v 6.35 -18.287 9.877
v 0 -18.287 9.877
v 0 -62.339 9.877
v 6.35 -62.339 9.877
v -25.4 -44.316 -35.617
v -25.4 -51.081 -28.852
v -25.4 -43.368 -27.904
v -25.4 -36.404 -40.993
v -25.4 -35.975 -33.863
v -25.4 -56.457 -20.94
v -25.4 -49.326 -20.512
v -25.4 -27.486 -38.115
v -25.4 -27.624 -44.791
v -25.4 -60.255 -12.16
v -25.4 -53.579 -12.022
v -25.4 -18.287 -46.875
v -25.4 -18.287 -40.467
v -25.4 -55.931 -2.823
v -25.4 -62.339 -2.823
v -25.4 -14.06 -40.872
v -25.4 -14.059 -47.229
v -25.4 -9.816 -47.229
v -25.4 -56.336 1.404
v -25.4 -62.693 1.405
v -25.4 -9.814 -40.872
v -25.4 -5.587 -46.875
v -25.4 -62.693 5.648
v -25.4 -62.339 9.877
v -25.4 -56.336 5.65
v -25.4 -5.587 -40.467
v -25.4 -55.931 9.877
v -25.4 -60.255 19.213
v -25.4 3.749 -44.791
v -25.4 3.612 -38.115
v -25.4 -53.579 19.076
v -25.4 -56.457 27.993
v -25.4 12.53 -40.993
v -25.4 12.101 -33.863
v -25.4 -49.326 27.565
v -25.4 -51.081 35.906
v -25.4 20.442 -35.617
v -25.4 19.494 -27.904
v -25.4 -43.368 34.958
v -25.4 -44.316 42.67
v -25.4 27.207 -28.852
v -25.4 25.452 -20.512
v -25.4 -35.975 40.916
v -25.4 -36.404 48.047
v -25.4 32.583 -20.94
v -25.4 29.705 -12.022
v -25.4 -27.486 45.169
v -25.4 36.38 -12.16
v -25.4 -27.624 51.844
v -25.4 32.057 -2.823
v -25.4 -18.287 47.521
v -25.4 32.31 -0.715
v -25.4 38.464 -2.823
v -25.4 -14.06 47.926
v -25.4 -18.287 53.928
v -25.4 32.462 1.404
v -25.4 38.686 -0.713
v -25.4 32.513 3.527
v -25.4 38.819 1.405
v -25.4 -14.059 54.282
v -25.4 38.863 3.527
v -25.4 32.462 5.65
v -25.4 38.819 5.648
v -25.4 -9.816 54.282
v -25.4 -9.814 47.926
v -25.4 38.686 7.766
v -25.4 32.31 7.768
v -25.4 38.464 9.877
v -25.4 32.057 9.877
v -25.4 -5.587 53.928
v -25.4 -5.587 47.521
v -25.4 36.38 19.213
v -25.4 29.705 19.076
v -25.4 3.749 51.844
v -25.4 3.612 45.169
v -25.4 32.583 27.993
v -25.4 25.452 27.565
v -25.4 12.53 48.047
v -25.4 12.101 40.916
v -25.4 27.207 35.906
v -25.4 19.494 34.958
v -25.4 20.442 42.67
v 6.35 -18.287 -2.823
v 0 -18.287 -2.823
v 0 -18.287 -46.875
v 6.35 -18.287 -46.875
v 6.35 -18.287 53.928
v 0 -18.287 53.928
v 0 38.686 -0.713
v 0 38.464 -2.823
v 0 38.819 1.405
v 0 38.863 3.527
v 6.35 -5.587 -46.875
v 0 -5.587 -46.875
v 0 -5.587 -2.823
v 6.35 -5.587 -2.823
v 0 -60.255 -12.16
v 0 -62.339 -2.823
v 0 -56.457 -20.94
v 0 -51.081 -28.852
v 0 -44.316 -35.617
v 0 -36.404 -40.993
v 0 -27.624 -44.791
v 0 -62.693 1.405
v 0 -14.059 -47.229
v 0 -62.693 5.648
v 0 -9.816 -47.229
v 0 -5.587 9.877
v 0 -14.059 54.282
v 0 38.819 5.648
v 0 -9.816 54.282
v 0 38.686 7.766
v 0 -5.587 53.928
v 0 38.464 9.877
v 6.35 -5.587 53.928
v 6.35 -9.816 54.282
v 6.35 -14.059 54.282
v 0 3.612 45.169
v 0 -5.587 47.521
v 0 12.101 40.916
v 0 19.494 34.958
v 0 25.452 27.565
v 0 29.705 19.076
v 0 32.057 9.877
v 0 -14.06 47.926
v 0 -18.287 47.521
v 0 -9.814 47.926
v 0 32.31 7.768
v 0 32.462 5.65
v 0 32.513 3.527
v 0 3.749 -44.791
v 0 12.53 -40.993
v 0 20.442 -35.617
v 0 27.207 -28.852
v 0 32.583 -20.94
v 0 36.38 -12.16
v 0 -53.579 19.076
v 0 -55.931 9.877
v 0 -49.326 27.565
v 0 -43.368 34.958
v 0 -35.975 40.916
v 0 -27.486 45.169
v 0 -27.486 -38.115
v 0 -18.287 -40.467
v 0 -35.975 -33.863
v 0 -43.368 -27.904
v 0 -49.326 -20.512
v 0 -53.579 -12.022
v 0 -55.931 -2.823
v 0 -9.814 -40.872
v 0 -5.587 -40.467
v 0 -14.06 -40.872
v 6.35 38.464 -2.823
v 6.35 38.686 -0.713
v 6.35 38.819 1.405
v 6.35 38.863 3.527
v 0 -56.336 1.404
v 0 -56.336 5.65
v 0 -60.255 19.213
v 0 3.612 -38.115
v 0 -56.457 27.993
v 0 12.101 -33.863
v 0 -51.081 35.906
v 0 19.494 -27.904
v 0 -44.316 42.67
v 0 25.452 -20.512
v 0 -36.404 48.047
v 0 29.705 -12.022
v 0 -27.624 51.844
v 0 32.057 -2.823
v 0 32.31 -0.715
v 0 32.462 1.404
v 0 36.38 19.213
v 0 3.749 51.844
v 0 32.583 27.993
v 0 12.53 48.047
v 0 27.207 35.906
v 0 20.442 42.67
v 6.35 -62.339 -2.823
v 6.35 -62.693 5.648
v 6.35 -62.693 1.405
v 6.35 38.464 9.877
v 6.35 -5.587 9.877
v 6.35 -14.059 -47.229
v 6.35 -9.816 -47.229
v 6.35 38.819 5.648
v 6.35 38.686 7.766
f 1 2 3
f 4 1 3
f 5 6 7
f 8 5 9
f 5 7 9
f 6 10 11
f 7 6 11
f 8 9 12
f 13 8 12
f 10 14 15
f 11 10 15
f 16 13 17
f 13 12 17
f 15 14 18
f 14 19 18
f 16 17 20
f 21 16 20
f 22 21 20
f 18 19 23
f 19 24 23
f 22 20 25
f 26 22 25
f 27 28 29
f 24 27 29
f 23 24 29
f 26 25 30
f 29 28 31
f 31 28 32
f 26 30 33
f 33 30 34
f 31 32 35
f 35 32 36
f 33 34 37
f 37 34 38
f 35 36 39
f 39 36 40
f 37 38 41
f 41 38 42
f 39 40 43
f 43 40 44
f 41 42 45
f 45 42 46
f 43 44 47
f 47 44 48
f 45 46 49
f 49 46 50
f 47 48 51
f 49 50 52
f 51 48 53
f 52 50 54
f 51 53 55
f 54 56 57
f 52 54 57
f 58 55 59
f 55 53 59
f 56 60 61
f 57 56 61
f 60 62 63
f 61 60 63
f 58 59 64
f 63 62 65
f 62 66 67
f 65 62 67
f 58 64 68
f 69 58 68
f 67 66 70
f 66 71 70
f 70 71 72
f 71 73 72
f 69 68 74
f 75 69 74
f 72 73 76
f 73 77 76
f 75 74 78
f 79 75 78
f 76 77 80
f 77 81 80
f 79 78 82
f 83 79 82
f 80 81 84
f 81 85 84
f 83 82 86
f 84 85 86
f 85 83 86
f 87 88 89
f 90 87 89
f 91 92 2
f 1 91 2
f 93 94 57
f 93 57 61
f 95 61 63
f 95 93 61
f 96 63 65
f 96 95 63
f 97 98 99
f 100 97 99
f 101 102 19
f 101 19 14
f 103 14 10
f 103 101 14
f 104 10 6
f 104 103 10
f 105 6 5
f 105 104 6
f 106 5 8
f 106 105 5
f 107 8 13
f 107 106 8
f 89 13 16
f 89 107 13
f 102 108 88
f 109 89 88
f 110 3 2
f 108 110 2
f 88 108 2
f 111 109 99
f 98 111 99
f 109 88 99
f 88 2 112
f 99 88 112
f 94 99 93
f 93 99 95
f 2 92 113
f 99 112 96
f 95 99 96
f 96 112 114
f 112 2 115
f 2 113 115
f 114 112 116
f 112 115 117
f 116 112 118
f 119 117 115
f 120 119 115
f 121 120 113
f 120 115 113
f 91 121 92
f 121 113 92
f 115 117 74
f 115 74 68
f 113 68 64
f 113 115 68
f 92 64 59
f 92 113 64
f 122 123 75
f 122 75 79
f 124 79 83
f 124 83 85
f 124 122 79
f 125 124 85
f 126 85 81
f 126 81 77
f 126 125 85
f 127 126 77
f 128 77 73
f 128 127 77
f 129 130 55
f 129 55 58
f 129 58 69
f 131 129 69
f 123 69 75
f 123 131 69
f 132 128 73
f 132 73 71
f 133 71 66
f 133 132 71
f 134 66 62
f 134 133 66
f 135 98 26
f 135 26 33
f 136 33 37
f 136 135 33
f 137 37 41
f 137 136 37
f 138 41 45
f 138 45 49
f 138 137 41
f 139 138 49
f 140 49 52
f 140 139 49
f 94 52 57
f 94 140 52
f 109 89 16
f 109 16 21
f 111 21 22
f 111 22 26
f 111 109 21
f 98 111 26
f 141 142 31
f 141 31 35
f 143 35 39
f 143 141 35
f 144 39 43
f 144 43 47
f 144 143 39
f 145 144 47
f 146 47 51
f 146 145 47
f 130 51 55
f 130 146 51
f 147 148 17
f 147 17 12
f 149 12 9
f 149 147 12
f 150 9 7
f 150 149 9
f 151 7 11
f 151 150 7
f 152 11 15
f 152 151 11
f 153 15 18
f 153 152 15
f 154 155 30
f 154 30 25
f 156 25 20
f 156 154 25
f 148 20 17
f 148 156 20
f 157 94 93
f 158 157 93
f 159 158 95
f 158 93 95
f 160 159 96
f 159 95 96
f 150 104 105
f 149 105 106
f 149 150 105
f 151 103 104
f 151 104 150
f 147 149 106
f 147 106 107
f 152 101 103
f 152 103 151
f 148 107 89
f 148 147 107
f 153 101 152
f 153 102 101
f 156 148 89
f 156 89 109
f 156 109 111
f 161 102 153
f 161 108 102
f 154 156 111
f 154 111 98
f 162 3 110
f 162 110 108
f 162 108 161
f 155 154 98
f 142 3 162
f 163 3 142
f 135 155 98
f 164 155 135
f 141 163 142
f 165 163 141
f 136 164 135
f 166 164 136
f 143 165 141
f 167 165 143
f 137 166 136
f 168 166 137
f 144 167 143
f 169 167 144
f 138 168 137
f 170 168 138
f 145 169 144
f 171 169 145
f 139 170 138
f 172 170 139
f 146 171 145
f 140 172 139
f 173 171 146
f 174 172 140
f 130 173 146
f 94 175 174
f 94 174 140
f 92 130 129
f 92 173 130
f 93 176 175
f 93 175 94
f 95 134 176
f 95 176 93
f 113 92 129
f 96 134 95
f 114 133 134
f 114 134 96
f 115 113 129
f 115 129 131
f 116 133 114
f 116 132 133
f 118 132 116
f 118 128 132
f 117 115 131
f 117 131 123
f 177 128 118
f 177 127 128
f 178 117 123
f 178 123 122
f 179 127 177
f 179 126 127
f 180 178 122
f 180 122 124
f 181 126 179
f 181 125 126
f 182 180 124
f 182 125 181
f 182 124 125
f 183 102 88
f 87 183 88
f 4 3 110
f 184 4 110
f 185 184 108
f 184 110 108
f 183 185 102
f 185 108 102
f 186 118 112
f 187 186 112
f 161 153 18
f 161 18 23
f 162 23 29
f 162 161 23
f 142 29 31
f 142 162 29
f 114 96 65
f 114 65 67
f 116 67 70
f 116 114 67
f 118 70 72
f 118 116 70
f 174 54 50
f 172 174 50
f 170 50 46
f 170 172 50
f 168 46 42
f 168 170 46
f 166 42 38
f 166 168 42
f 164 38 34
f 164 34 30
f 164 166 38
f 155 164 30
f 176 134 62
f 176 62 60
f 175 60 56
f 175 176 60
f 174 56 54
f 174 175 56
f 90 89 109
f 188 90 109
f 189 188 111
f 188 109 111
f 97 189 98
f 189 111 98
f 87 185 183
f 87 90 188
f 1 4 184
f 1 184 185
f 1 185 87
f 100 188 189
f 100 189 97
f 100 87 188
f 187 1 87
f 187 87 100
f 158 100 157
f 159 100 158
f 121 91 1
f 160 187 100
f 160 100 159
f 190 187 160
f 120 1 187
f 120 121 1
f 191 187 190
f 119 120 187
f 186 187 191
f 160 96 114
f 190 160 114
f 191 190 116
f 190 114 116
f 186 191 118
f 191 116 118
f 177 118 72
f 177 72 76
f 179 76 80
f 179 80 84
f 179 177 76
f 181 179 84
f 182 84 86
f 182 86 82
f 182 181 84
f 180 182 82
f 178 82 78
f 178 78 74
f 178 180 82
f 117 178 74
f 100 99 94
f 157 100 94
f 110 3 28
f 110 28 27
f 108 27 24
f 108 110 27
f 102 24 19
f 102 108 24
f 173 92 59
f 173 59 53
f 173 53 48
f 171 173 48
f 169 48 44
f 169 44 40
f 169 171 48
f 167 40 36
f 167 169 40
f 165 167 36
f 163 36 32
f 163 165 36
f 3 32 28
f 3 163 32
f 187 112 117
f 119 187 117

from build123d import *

# Parameters (mm, degrees)
F1_DEPTH = 6.3499999233
F2_DEPTH = 25.4


with BuildPart() as f1:
    # F0 (on Right) → F1 (new body)
    with BuildSketch(Plane.YZ):
        with BuildLine():
            Line((-5.5871092111, 47.5208675413), (-5.5871092111, 53.9283395048))
            ThreePointArc((-5.5871092111, 53.9283395048), (-11.9371092111, 54.326777029), (-18.2871092111, 53.9283395048))
            Line((-18.2871092111, 53.9283395048), (-18.2871092111, 47.5208675413))
            ThreePointArc((-18.2871092111, 47.5208675413), (-11.9371092111, 47.976777029), (-5.5871092111, 47.5208675413))
        make_face()
        with BuildLine():
            ThreePointArc((32.5128907889, 3.526777029), (32.3987669124, 6.7099497176), (32.0569813012, 9.876777029))
            Line((32.0569813012, 9.876777029), (-5.5871092111, 9.876777029))
            Line((-5.5871092111, 9.876777029), (-5.5871092111, 47.5208675413))
            ThreePointArc((-5.5871092111, 47.5208675413), (-11.9371092111, 47.976777029), (-18.2871092111, 47.5208675413))
            Line((-18.2871092111, 47.5208675413), (-18.2871092111, 9.876777029))
            Line((-18.2871092111, 9.876777029), (-55.9311997233, 9.876777029))
            ThreePointArc((-55.9311997233, 9.876777029), (-56.3871092111, 3.526777029), (-55.9311997233, -2.823222971))
            Line((-55.9311997233, -2.823222971), (-18.2871092111, -2.823222971))
            Line((-18.2871092111, -2.823222971), (-18.2871092111, -40.4673134832))
            ThreePointArc((-18.2871092111, -40.4673134832), (-11.9371092111, -40.923222971), (-5.5871092111, -40.4673134832))
            Line((-5.5871092111, -40.4673134832), (-5.5871092111, -2.823222971))
            Line((-5.5871092111, -2.823222971), (32.0569813012, -2.823222971))
            ThreePointArc((32.0569813012, -2.823222971), (32.3987669124, 0.3436043405), (32.5128907889, 3.526777029))
        make_face()
        with BuildLine():
            Line((-55.9311997233, 9.876777029), (-62.3386716869, 9.876777029))
            ThreePointArc((-62.3386716869, 9.876777029), (-62.7371092111, 3.526777029), (-62.3386716869, -2.823222971))
            Line((-62.3386716869, -2.823222971), (-55.9311997233, -2.823222971))
            ThreePointArc((-55.9311997233, -2.823222971), (-56.3871092111, 3.526777029), (-55.9311997233, 9.876777029))
        make_face()
        with BuildLine():
            ThreePointArc((38.4644532647, -2.823222971), (38.7631835581, 0.3455330718), (38.8628907889, 3.526777029))
            ThreePointArc((38.8628907889, 3.526777029), (38.7631835581, 6.7080209862), (38.4644532647, 9.876777029))
            Line((38.4644532647, 9.876777029), (32.0569813012, 9.876777029))
            ThreePointArc((32.0569813012, 9.876777029), (32.3987669124, 6.7099497176), (32.5128907889, 3.526777029))
            ThreePointArc((32.5128907889, 3.526777029), (32.3987669124, 0.3436043405), (32.0569813012, -2.823222971))
            Line((32.0569813012, -2.823222971), (38.4644532647, -2.823222971))
        make_face()
        with BuildLine():
            ThreePointArc((-18.2871092111, -46.8747854467), (-11.9371092111, -47.273222971), (-5.5871092111, -46.8747854467))
            Line((-5.5871092111, -46.8747854467), (-5.5871092111, -40.4673134832))
            ThreePointArc((-5.5871092111, -40.4673134832), (-11.9371092111, -40.923222971), (-18.2871092111, -40.4673134832))
            Line((-18.2871092111, -40.4673134832), (-18.2871092111, -46.8747854467))
        make_face()
    extrude(amount=F1_DEPTH)


with BuildPart() as f2:
    # F0 (on Right) → F2 (new body)
    with BuildSketch(Plane.YZ):
        with BuildLine():
            ThreePointArc((38.4644532647, -2.823222971), (38.7631835581, 0.3455330718), (38.8628907889, 3.526777029))
            ThreePointArc((38.8628907889, 3.526777029), (38.7631835581, 6.7080209862), (38.4644532647, 9.876777029))
            Line((38.4644532647, 9.876777029), (32.0569813012, 9.876777029))
            ThreePointArc((32.0569813012, 9.876777029), (32.3987669124, 6.7099497176), (32.5128907889, 3.526777029))
            ThreePointArc((32.5128907889, 3.526777029), (32.3987669124, 0.3436043405), (32.0569813012, -2.823222971))
            Line((32.0569813012, -2.823222971), (38.4644532647, -2.823222971))
        make_face()
        with BuildLine():
            Line((32.0569813012, 9.876777029), (38.4644532647, 9.876777029))
            ThreePointArc((38.4644532647, 9.876777029), (23.9839152732, 39.4478015133), (-5.5871092111, 53.9283395048))
            Line((-5.5871092111, 53.9283395048), (-5.5871092111, 47.5208675413))
            ThreePointArc((-5.5871092111, 47.5208675413), (19.4937872127, 34.9576734528), (32.0569813012, 9.876777029))
        make_face()
        with BuildLine():
            ThreePointArc((-5.5871092111, -46.8747854467), (23.9839152732, -32.3942474552), (38.4644532647, -2.823222971))
            Line((38.4644532647, -2.823222971), (32.0569813012, -2.823222971))
            ThreePointArc((32.0569813012, -2.823222971), (19.4937872127, -27.9041193947), (-5.5871092111, -40.4673134832))
            Line((-5.5871092111, -40.4673134832), (-5.5871092111, -46.8747854467))
        make_face()
        with BuildLine():
            Line((-5.5871092111, 47.5208675413), (-5.5871092111, 53.9283395048))
            ThreePointArc((-5.5871092111, 53.9283395048), (-11.9371092111, 54.326777029), (-18.2871092111, 53.9283395048))
            Line((-18.2871092111, 53.9283395048), (-18.2871092111, 47.5208675413))
            ThreePointArc((-18.2871092111, 47.5208675413), (-11.9371092111, 47.976777029), (-5.5871092111, 47.5208675413))
        make_face()
        with BuildLine():
            ThreePointArc((-18.2871092111, -46.8747854467), (-11.9371092111, -47.273222971), (-5.5871092111, -46.8747854467))
            Line((-5.5871092111, -46.8747854467), (-5.5871092111, -40.4673134832))
            ThreePointArc((-5.5871092111, -40.4673134832), (-11.9371092111, -40.923222971), (-18.2871092111, -40.4673134832))
            Line((-18.2871092111, -40.4673134832), (-18.2871092111, -46.8747854467))
        make_face()
        with BuildLine():
            Line((-18.2871092111, 47.5208675413), (-18.2871092111, 53.9283395048))
            ThreePointArc((-18.2871092111, 53.9283395048), (-47.8581336954, 39.4478015133), (-62.3386716869, 9.876777029))
            Line((-62.3386716869, 9.876777029), (-55.9311997233, 9.876777029))
            ThreePointArc((-55.9311997233, 9.876777029), (-43.3680056348, 34.9576734528), (-18.2871092111, 47.5208675413))
        make_face()
        with BuildLine():
            ThreePointArc((-62.3386716869, -2.823222971), (-47.8581336954, -32.3942474552), (-18.2871092111, -46.8747854467))
            Line((-18.2871092111, -46.8747854467), (-18.2871092111, -40.4673134832))
            ThreePointArc((-18.2871092111, -40.4673134832), (-43.3680056348, -27.9041193947), (-55.9311997233, -2.823222971))
            Line((-55.9311997233, -2.823222971), (-62.3386716869, -2.823222971))
        make_face()
        with BuildLine():
            Line((-55.9311997233, 9.876777029), (-62.3386716869, 9.876777029))
            ThreePointArc((-62.3386716869, 9.876777029), (-62.7371092111, 3.526777029), (-62.3386716869, -2.823222971))
            Line((-62.3386716869, -2.823222971), (-55.9311997233, -2.823222971))
            ThreePointArc((-55.9311997233, -2.823222971), (-56.3871092111, 3.526777029), (-55.9311997233, 9.876777029))
        make_face()
    extrude(amount=-F2_DEPTH)


solid = Compound([f1.part, f2.part])
